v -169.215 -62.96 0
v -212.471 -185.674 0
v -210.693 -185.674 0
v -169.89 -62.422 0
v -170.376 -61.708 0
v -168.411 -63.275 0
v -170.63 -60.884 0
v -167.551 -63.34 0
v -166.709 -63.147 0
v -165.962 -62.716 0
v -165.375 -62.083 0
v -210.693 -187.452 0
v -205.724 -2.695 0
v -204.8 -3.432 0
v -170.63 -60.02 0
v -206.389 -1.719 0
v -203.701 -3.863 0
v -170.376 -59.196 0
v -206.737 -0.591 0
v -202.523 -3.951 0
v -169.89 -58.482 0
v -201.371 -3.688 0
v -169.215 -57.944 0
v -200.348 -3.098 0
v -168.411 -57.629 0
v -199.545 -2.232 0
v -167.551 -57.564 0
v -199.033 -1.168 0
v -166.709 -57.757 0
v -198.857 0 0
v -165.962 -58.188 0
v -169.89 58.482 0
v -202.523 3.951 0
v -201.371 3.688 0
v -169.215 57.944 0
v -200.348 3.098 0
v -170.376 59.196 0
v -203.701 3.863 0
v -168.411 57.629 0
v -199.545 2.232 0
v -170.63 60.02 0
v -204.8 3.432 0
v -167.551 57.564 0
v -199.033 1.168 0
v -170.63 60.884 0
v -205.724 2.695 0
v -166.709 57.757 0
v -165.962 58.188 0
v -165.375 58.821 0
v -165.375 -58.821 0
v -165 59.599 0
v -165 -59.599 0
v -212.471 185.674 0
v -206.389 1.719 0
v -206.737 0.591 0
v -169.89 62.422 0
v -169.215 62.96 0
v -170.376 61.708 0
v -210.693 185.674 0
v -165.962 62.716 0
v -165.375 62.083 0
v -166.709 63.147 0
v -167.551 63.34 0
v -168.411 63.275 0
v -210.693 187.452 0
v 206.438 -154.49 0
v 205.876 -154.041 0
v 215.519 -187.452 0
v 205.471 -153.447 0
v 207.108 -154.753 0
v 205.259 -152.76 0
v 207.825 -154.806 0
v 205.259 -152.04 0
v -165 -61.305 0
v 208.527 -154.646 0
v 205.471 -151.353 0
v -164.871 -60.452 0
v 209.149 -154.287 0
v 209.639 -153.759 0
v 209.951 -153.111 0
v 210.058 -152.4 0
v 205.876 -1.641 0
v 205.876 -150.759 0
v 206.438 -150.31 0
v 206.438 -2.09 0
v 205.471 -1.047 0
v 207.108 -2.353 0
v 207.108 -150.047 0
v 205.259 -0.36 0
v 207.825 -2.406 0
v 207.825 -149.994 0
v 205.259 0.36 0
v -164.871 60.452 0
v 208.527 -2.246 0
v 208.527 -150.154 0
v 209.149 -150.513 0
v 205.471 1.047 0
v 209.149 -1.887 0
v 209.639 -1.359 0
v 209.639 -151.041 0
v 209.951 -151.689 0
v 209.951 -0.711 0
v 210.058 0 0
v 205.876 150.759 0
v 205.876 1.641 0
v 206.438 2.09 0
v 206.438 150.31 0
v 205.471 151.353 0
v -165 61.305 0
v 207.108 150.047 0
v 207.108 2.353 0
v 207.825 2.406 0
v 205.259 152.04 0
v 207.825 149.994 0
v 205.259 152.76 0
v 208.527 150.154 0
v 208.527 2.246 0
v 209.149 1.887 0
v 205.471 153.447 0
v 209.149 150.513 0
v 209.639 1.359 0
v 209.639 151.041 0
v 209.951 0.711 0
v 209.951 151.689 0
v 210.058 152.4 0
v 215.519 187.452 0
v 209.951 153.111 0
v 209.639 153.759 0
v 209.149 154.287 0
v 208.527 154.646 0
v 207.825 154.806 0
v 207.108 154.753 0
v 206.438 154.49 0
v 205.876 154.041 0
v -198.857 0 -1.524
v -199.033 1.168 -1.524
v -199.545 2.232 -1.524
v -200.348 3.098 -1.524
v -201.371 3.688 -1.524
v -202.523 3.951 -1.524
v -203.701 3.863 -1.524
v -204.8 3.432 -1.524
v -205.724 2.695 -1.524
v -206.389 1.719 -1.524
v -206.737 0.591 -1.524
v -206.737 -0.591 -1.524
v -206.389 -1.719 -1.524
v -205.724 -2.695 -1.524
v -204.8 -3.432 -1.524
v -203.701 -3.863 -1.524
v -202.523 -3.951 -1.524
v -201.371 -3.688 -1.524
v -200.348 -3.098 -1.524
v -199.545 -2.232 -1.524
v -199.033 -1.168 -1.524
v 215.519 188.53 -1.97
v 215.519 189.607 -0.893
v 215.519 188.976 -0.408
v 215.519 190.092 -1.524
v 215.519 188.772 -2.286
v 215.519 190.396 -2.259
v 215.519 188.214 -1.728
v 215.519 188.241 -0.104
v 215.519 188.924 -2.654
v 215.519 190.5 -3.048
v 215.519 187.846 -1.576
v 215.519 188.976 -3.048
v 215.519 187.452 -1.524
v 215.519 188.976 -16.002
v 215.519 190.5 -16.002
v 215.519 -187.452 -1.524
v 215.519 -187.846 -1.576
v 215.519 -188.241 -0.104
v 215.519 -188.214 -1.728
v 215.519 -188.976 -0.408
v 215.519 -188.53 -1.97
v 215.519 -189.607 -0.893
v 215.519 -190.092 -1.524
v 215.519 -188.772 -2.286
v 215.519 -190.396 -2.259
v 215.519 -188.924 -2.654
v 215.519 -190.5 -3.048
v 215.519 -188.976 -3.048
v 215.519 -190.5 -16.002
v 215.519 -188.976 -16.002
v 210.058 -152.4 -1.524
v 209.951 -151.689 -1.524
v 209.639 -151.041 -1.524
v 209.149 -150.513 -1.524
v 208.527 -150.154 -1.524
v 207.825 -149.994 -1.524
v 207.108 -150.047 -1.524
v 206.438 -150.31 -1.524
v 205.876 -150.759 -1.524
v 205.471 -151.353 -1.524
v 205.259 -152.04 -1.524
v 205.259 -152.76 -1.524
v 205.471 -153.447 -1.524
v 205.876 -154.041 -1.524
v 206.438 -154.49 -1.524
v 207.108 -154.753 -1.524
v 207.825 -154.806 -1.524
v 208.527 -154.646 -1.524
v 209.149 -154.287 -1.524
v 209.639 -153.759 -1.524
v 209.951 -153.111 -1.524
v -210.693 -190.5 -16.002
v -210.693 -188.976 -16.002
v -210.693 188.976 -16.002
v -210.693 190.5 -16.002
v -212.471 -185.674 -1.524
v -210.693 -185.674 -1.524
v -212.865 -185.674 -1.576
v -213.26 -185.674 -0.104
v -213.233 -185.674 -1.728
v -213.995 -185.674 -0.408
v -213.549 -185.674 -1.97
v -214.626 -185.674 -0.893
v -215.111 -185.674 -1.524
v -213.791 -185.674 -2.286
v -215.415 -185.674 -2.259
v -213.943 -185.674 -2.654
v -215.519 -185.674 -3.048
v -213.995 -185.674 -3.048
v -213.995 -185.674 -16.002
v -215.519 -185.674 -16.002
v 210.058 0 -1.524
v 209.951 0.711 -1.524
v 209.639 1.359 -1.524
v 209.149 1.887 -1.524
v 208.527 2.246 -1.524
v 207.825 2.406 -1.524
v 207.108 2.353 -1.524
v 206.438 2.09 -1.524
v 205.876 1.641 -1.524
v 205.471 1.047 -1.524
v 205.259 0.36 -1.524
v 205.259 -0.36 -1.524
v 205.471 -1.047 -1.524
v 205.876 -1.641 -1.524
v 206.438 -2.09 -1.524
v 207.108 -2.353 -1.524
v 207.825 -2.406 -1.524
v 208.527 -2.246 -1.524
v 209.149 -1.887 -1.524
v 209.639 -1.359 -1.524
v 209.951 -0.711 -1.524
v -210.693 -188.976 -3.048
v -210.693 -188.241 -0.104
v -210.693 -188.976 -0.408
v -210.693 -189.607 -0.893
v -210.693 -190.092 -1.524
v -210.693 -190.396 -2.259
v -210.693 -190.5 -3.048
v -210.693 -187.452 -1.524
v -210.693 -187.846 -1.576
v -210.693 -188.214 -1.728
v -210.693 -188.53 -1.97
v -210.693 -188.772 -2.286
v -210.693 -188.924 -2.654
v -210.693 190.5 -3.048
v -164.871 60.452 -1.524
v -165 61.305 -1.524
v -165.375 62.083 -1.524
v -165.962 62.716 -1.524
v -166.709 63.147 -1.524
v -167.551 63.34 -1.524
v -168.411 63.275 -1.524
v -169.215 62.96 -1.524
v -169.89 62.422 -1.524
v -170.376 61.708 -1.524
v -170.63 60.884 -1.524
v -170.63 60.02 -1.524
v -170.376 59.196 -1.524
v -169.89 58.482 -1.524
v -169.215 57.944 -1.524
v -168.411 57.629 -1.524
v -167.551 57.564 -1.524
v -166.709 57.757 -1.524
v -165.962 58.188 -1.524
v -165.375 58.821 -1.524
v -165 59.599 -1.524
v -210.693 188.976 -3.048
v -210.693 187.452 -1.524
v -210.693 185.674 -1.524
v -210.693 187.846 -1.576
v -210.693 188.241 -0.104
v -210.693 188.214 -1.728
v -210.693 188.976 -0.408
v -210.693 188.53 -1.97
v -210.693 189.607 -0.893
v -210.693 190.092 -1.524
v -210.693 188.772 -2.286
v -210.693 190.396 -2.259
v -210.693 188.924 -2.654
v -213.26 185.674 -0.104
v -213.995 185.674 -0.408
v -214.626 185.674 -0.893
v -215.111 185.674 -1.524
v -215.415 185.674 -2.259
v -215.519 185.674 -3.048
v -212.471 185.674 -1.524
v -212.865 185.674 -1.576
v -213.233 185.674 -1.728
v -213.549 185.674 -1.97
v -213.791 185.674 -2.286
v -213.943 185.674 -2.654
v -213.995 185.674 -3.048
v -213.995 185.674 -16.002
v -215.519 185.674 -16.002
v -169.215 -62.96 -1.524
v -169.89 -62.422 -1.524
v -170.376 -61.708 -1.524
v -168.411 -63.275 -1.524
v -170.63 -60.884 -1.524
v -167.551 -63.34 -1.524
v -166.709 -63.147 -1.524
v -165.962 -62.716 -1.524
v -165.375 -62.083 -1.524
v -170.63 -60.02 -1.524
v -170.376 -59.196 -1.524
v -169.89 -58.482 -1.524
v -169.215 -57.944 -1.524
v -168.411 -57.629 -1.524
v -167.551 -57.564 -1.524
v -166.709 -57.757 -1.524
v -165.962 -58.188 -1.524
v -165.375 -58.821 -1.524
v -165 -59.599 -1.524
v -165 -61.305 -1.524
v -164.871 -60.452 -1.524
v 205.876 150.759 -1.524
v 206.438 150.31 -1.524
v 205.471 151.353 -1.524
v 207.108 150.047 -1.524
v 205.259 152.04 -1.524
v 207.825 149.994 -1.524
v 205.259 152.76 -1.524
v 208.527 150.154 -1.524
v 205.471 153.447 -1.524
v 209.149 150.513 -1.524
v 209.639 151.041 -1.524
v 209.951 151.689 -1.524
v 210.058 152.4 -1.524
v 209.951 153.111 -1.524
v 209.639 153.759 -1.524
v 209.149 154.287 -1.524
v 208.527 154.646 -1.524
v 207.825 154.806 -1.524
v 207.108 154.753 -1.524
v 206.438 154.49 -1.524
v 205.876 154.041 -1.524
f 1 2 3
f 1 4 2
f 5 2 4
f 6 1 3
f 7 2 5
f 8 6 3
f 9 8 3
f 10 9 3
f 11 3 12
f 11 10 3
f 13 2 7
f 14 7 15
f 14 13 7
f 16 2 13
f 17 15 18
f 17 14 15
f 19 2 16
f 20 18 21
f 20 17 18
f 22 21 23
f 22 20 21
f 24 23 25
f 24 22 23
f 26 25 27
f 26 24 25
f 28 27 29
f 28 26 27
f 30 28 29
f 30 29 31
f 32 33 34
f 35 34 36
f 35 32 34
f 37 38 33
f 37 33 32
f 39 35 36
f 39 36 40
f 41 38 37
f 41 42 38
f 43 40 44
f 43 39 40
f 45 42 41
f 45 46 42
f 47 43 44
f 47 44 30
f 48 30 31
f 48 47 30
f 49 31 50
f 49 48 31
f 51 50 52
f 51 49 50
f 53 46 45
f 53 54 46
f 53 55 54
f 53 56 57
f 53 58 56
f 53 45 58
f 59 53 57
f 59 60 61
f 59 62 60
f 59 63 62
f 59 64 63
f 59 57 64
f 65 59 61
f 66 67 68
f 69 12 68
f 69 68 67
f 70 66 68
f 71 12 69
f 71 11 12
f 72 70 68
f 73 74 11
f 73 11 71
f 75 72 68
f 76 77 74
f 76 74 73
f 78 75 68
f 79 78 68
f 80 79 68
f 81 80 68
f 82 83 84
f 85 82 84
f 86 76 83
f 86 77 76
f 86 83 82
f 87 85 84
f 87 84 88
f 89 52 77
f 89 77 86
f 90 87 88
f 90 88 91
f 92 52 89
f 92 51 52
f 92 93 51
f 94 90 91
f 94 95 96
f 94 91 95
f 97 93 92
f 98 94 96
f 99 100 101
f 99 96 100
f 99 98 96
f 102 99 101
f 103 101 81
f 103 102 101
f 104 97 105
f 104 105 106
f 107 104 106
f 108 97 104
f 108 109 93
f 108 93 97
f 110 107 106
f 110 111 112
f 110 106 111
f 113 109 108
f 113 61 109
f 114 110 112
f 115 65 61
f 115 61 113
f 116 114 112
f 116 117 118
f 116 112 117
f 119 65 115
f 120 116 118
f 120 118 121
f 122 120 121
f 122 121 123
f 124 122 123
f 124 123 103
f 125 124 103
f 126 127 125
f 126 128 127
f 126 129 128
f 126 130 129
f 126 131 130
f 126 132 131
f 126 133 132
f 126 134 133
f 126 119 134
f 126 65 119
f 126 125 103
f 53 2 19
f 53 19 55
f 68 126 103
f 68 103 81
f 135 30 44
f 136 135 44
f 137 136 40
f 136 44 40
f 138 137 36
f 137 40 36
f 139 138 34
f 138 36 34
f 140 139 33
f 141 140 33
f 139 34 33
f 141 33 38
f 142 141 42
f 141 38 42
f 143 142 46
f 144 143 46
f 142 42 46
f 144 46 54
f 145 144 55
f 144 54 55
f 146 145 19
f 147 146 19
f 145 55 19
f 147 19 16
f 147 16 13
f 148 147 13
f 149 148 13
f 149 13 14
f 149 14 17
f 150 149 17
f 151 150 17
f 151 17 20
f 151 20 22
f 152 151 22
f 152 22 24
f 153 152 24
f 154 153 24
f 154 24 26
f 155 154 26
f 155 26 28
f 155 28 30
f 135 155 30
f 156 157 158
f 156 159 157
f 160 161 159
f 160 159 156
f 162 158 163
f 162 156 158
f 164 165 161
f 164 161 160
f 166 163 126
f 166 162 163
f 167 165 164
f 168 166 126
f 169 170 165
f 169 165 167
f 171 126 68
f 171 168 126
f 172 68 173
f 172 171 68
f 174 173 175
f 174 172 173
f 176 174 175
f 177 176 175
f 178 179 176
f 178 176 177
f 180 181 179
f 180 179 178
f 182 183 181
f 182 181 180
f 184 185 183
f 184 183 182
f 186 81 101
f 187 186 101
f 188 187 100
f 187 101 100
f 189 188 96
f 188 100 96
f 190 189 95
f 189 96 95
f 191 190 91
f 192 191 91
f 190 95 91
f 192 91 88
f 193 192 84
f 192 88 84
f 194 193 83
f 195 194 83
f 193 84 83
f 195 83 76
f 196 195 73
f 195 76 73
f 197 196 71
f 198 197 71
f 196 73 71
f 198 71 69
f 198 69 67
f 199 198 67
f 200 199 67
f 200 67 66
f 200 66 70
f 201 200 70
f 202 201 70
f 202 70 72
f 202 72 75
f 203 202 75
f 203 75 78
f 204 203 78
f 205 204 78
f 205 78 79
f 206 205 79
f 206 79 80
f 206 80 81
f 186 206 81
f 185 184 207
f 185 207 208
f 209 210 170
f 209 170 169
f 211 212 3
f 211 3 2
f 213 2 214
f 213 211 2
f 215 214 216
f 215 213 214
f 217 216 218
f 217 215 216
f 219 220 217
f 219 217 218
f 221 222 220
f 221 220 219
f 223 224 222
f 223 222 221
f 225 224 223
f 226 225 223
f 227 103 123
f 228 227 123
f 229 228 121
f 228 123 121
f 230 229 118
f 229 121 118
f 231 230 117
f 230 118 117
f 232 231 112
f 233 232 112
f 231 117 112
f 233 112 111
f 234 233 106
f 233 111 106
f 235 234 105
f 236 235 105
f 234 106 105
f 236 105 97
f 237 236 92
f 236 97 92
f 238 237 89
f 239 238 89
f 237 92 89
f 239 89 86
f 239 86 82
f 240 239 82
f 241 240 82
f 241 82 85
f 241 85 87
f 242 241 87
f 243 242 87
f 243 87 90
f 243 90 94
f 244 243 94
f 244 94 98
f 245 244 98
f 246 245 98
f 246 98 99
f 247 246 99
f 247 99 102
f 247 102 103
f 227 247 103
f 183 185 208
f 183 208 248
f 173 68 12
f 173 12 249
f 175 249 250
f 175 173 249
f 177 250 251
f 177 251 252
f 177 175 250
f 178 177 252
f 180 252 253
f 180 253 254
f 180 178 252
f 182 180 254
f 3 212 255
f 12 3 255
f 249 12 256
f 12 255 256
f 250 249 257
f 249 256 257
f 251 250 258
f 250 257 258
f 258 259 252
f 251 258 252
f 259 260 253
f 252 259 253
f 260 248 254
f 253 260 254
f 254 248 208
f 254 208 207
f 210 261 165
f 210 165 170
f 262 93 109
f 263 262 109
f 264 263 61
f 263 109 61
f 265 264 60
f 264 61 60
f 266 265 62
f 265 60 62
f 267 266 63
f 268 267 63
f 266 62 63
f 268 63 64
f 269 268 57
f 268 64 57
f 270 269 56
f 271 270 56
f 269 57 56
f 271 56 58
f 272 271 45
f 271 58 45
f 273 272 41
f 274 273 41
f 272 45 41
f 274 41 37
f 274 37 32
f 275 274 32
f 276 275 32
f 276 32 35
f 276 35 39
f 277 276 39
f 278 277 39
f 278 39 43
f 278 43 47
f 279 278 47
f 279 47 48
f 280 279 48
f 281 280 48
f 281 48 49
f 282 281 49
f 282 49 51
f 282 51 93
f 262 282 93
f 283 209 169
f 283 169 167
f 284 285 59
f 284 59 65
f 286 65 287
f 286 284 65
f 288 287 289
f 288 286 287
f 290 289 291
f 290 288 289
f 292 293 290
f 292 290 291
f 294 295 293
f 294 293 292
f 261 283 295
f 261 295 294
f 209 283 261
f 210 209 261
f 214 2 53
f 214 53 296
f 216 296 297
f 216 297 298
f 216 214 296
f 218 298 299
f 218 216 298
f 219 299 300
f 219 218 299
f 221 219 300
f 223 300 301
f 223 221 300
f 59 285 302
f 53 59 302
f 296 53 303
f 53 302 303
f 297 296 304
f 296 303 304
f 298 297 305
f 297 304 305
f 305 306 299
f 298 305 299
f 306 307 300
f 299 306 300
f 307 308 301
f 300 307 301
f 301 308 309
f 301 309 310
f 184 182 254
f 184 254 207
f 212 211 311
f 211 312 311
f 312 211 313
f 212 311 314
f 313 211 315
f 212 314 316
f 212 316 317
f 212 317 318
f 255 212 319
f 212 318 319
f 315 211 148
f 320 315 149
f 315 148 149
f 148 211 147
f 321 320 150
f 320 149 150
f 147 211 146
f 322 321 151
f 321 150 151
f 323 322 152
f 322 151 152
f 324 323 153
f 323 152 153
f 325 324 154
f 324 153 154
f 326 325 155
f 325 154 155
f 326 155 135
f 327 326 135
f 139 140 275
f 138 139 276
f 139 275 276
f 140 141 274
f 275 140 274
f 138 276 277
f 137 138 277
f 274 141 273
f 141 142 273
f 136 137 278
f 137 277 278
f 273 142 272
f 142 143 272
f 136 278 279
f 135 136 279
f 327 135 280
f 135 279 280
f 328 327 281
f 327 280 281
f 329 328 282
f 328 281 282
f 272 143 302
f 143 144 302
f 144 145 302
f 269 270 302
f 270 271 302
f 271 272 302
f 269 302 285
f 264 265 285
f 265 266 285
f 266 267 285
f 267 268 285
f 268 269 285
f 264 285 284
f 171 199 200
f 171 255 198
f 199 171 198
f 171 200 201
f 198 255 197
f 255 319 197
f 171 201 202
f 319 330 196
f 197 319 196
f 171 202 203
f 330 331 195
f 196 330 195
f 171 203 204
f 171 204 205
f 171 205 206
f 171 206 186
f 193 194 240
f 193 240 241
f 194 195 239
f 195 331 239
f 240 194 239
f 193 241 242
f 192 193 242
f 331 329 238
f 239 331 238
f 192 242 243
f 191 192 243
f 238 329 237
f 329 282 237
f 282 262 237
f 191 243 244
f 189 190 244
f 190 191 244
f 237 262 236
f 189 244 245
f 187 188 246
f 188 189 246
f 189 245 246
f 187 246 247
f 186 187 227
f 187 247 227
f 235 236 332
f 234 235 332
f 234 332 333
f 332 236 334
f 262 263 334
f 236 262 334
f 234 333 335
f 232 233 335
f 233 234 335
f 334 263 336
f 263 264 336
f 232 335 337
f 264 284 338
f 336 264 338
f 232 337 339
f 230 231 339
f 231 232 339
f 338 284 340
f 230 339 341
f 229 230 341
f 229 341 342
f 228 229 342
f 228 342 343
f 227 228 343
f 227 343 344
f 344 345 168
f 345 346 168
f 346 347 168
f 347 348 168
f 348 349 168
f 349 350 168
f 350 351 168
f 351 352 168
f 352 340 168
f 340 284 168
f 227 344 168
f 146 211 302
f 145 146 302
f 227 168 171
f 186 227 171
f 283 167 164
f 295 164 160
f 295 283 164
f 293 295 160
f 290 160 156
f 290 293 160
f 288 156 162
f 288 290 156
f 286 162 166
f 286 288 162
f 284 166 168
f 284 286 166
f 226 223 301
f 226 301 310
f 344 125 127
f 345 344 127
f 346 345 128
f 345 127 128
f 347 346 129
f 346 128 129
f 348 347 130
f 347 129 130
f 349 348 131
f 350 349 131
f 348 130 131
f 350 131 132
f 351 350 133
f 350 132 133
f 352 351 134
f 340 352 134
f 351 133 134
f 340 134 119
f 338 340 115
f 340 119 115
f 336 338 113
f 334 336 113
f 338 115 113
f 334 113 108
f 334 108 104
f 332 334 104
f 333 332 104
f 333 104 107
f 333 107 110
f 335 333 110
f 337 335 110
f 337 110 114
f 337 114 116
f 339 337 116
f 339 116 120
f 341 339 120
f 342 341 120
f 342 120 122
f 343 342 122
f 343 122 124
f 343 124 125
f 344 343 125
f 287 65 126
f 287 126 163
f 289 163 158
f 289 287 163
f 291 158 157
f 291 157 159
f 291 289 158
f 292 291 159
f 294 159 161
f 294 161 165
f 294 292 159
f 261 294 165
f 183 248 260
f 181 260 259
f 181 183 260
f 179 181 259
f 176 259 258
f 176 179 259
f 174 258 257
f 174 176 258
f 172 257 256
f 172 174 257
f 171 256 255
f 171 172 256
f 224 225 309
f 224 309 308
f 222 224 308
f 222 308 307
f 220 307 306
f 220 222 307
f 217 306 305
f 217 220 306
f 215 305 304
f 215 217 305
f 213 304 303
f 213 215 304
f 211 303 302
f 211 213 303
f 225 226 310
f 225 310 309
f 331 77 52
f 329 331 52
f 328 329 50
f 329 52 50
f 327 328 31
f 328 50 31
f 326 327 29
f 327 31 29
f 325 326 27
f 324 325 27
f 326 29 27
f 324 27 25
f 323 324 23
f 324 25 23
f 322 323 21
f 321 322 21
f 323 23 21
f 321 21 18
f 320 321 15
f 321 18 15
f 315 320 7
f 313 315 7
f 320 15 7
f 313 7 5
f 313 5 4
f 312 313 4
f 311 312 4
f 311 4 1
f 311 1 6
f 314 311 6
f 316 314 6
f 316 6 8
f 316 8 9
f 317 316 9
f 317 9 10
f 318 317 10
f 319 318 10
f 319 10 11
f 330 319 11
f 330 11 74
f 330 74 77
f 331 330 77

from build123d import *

# Parameters (mm, degrees)
CROQUIS1_W                         = 431.038
CROQUIS1_H                         = 381
BRIDA_BASE1_DEPTH                  = 1.524
CORTAR_EXTRUIR1_REACH              = 289.647
CROQUIS6_W                         = 4.826
CROQUIS6_H                         = 4.826
BRIDA_DE_ARISTA1_STRIP_W           = 9.144
BRIDA_DE_ARISTA1_STRIP_H           = 1.524
BRIDA_DE_ARISTA1_STRIP_CUT_DEPTH   = 426.212
BRIDA_DE_ARISTA1_STRIP_2_W         = 9.144
BRIDA_DE_ARISTA1_STRIP_2_H         = 1.524
BRIDA_DE_ARISTA1_STRIP_CUT_2_DEPTH = 426.212
BRIDA_DE_ARISTA1_STRIP_3_W         = 9.144
BRIDA_DE_ARISTA1_STRIP_3_H         = 1.524
BRIDA_DE_ARISTA1_STRIP_CUT_3_DEPTH = 371.348
BRIDA_DE_ARISTA1_DEPTH             = 426.212
BRIDA_DE_ARISTA1_BEND_DEPTH        = 426.212
BRIDA_DE_ARISTA1_BEND_2_DEPTH      = 371.348
CORTAR_EXTRUIR2_REACH              = 290.088
CROQUIS16_R                        = 3.9624
CROQUIS16_R_2                      = 2.8956
CROQUIS16_R_3                      = 2.413


# Sheet-metal steps are written as plain solids
with BuildPart() as part:
    # Croquis1 → Brida base1 (new body)
    with BuildSketch(Plane.XY):
        Rectangle(CROQUIS1_W, CROQUIS1_H)
    extrude(amount=-BRIDA_BASE1_DEPTH)

    # Croquis6 → Cortar-Extruir1 (cut, up to next)
    with BuildSketch(Plane.XY, mode=Mode.PRIVATE) as cortar_extruir1_sk1:
        with Locations((-213.106, 188.087)):
            Rectangle(CROQUIS6_W, CROQUIS6_H)
    cortar_extruir1_tool1 = extrude(cortar_extruir1_sk1.sketch, amount=-CORTAR_EXTRUIR1_REACH, mode=Mode.PRIVATE) & part.part
    # Croquis6 → Cortar-Extruir1 (cut, up to next)
    with BuildSketch(Plane.XY, mode=Mode.PRIVATE) as cortar_extruir1_sk2:
        with Locations((-213.106, -188.087)):
            Rectangle(CROQUIS6_W, CROQUIS6_H)
    cortar_extruir1_tool2 = extrude(cortar_extruir1_sk2.sketch, amount=-CORTAR_EXTRUIR1_REACH, mode=Mode.PRIVATE) & part.part
    add(cortar_extruir1_tool1.solids().sort_by_distance((-213.106, 188.087, 0))[0], mode=Mode.SUBTRACT)
    add(cortar_extruir1_tool2.solids().sort_by_distance((-213.106, -188.087, 0))[0], mode=Mode.SUBTRACT)

    # Brida de arista1 strip (across the edge) → Brida de arista1 strip cut (cut)
    with BuildSketch(Plane(origin=(-210.693, 190.5, -1.524), x_dir=(0, -1, 0), z_dir=(1, 0, 0))):
        with Locations((-1.524, -0.762)):
            Rectangle(BRIDA_DE_ARISTA1_STRIP_W, BRIDA_DE_ARISTA1_STRIP_H)
    extrude(amount=BRIDA_DE_ARISTA1_STRIP_CUT_DEPTH, mode=Mode.SUBTRACT)

    # Brida de arista1 strip 2 (across the edge) → Brida de arista1 strip cut 2 (cut)
    with BuildSketch(Plane(origin=(215.519, -190.5, -1.524), x_dir=(0, 1, 0), z_dir=(-1, 0, 0))):
        with Locations((-1.524, -0.762)):
            Rectangle(BRIDA_DE_ARISTA1_STRIP_2_W, BRIDA_DE_ARISTA1_STRIP_2_H)
    extrude(amount=BRIDA_DE_ARISTA1_STRIP_CUT_2_DEPTH, mode=Mode.SUBTRACT)

    # Brida de arista1 strip 3 (across the edge) → Brida de arista1 strip cut 3 (cut)
    with BuildSketch(Plane(origin=(-215.519, -185.674, -1.524), x_dir=(1, 0, 0), z_dir=(0, 1, 0))):
        with Locations((-1.524, -0.762)):
            Rectangle(BRIDA_DE_ARISTA1_STRIP_3_W, BRIDA_DE_ARISTA1_STRIP_3_H)
    extrude(amount=BRIDA_DE_ARISTA1_STRIP_CUT_3_DEPTH, mode=Mode.SUBTRACT)

    # Brida de arista1 section (across the edge) → Brida de arista1 (add)
    with BuildSketch(Plane(origin=(-210.693, 190.5, -1.524), x_dir=(0, -1, 0), z_dir=(1, 0, 0))):
        with BuildLine():
            Line((0, 1.524), (0, 14.478))
            Line((0, 14.478), (1.524, 14.478))
            Line((1.524, 14.478), (1.524, 1.524))
            ThreePointArc((1.524, 1.524), (1.970369265, 0.446369265), (3.048, 0))
            Line((3.048, 0), (3.048, -1.524))
            ThreePointArc((3.048, -1.524), (0.892738531, -0.631261469), (0, 1.524))
        make_face()
    extrude(amount=BRIDA_DE_ARISTA1_DEPTH)

    # Brida de arista1 section 2 (across the edge) → Brida de arista1 bend (add)
    with BuildSketch(Plane(origin=(215.519, -190.5, -1.524), x_dir=(0, 1, 0), z_dir=(-1, 0, 0))):
        with BuildLine():
            Line((0, 1.524), (0, 14.478))
            Line((0, 14.478), (1.524, 14.478))
            Line((1.524, 14.478), (1.524, 1.524))
            ThreePointArc((1.524, 1.524), (1.970369265, 0.446369265), (3.048, 0))
            Line((3.048, 0), (3.048, -1.524))
            ThreePointArc((3.048, -1.524), (0.892738531, -0.631261469), (0, 1.524))
        make_face()
    extrude(amount=BRIDA_DE_ARISTA1_BEND_DEPTH)

    # Brida de arista1 section 3 (across the edge) → Brida de arista1 bend 2 (add)
    with BuildSketch(Plane(origin=(-215.519, -185.674, -1.524), x_dir=(1, 0, 0), z_dir=(0, 1, 0))):
        with BuildLine():
            Line((0, 1.524), (0, 14.478))
            Line((0, 14.478), (1.524, 14.478))
            Line((1.524, 14.478), (1.524, 1.524))
            ThreePointArc((1.524, 1.524), (1.970369265, 0.446369265), (3.048, 0))
            Line((3.048, 0), (3.048, -1.524))
            ThreePointArc((3.048, -1.524), (0.892738531, -0.631261469), (0, 1.524))
        make_face()
    extrude(amount=BRIDA_DE_ARISTA1_BEND_2_DEPTH)

    # Croquis16 → Cortar-Extruir2 (cut, up to next)
    with BuildSketch(Plane.XY, mode=Mode.PRIVATE) as cortar_extruir2_sk1:
        with Locations((-202.819, 0)):
            Circle(CROQUIS16_R)
    cortar_extruir2_tool1 = extrude(cortar_extruir2_sk1.sketch, amount=-CORTAR_EXTRUIR2_REACH, mode=Mode.PRIVATE) & part.part
    # Croquis16 → Cortar-Extruir2 (cut, up to next)
    with BuildSketch(Plane.XY, mode=Mode.PRIVATE) as cortar_extruir2_sk2:
        with Locations((-167.767, 60.452)):
            Circle(CROQUIS16_R_2)
    cortar_extruir2_tool2 = extrude(cortar_extruir2_sk2.sketch, amount=-CORTAR_EXTRUIR2_REACH, mode=Mode.PRIVATE) & part.part
    # Croquis16 → Cortar-Extruir2 (cut, up to next)
    with BuildSketch(Plane.XY, mode=Mode.PRIVATE) as cortar_extruir2_sk3:
        with Locations((-167.767, -60.452)):
            Circle(CROQUIS16_R_2)
    cortar_extruir2_tool3 = extrude(cortar_extruir2_sk3.sketch, amount=-CORTAR_EXTRUIR2_REACH, mode=Mode.PRIVATE) & part.part
    # Croquis16 → Cortar-Extruir2 (cut, up to next)
    with BuildSketch(Plane.XY, mode=Mode.PRIVATE) as cortar_extruir2_sk4:
        with Locations((207.645, 152.4)):
            Circle(CROQUIS16_R_3)
    cortar_extruir2_tool4 = extrude(cortar_extruir2_sk4.sketch, amount=-CORTAR_EXTRUIR2_REACH, mode=Mode.PRIVATE) & part.part
    # Croquis16 → Cortar-Extruir2 (cut, up to next)
    with BuildSketch(Plane.XY, mode=Mode.PRIVATE) as cortar_extruir2_sk5:
        with Locations((207.645, 0)):
            Circle(CROQUIS16_R_3)
    cortar_extruir2_tool5 = extrude(cortar_extruir2_sk5.sketch, amount=-CORTAR_EXTRUIR2_REACH, mode=Mode.PRIVATE) & part.part
    # Croquis16 → Cortar-Extruir2 (cut, up to next)
    with BuildSketch(Plane.XY, mode=Mode.PRIVATE) as cortar_extruir2_sk6:
        with Locations((207.645, -152.4)):
            Circle(CROQUIS16_R_3)
    cortar_extruir2_tool6 = extrude(cortar_extruir2_sk6.sketch, amount=-CORTAR_EXTRUIR2_REACH, mode=Mode.PRIVATE) & part.part
    add(cortar_extruir2_tool1.solids().sort_by_distance((-202.819, 0, 0))[0], mode=Mode.SUBTRACT)
    add(cortar_extruir2_tool2.solids().sort_by_distance((-167.767, 60.452, 0))[0], mode=Mode.SUBTRACT)
    add(cortar_extruir2_tool3.solids().sort_by_distance((-167.767, -60.452, 0))[0], mode=Mode.SUBTRACT)
    add(cortar_extruir2_tool4.solids().sort_by_distance((207.645, 152.4, 0))[0], mode=Mode.SUBTRACT)
    add(cortar_extruir2_tool5.solids().sort_by_distance((207.645, 0, 0))[0], mode=Mode.SUBTRACT)
    add(cortar_extruir2_tool6.solids().sort_by_distance((207.645, -152.4, 0))[0], mode=Mode.SUBTRACT)


solid = part.part
